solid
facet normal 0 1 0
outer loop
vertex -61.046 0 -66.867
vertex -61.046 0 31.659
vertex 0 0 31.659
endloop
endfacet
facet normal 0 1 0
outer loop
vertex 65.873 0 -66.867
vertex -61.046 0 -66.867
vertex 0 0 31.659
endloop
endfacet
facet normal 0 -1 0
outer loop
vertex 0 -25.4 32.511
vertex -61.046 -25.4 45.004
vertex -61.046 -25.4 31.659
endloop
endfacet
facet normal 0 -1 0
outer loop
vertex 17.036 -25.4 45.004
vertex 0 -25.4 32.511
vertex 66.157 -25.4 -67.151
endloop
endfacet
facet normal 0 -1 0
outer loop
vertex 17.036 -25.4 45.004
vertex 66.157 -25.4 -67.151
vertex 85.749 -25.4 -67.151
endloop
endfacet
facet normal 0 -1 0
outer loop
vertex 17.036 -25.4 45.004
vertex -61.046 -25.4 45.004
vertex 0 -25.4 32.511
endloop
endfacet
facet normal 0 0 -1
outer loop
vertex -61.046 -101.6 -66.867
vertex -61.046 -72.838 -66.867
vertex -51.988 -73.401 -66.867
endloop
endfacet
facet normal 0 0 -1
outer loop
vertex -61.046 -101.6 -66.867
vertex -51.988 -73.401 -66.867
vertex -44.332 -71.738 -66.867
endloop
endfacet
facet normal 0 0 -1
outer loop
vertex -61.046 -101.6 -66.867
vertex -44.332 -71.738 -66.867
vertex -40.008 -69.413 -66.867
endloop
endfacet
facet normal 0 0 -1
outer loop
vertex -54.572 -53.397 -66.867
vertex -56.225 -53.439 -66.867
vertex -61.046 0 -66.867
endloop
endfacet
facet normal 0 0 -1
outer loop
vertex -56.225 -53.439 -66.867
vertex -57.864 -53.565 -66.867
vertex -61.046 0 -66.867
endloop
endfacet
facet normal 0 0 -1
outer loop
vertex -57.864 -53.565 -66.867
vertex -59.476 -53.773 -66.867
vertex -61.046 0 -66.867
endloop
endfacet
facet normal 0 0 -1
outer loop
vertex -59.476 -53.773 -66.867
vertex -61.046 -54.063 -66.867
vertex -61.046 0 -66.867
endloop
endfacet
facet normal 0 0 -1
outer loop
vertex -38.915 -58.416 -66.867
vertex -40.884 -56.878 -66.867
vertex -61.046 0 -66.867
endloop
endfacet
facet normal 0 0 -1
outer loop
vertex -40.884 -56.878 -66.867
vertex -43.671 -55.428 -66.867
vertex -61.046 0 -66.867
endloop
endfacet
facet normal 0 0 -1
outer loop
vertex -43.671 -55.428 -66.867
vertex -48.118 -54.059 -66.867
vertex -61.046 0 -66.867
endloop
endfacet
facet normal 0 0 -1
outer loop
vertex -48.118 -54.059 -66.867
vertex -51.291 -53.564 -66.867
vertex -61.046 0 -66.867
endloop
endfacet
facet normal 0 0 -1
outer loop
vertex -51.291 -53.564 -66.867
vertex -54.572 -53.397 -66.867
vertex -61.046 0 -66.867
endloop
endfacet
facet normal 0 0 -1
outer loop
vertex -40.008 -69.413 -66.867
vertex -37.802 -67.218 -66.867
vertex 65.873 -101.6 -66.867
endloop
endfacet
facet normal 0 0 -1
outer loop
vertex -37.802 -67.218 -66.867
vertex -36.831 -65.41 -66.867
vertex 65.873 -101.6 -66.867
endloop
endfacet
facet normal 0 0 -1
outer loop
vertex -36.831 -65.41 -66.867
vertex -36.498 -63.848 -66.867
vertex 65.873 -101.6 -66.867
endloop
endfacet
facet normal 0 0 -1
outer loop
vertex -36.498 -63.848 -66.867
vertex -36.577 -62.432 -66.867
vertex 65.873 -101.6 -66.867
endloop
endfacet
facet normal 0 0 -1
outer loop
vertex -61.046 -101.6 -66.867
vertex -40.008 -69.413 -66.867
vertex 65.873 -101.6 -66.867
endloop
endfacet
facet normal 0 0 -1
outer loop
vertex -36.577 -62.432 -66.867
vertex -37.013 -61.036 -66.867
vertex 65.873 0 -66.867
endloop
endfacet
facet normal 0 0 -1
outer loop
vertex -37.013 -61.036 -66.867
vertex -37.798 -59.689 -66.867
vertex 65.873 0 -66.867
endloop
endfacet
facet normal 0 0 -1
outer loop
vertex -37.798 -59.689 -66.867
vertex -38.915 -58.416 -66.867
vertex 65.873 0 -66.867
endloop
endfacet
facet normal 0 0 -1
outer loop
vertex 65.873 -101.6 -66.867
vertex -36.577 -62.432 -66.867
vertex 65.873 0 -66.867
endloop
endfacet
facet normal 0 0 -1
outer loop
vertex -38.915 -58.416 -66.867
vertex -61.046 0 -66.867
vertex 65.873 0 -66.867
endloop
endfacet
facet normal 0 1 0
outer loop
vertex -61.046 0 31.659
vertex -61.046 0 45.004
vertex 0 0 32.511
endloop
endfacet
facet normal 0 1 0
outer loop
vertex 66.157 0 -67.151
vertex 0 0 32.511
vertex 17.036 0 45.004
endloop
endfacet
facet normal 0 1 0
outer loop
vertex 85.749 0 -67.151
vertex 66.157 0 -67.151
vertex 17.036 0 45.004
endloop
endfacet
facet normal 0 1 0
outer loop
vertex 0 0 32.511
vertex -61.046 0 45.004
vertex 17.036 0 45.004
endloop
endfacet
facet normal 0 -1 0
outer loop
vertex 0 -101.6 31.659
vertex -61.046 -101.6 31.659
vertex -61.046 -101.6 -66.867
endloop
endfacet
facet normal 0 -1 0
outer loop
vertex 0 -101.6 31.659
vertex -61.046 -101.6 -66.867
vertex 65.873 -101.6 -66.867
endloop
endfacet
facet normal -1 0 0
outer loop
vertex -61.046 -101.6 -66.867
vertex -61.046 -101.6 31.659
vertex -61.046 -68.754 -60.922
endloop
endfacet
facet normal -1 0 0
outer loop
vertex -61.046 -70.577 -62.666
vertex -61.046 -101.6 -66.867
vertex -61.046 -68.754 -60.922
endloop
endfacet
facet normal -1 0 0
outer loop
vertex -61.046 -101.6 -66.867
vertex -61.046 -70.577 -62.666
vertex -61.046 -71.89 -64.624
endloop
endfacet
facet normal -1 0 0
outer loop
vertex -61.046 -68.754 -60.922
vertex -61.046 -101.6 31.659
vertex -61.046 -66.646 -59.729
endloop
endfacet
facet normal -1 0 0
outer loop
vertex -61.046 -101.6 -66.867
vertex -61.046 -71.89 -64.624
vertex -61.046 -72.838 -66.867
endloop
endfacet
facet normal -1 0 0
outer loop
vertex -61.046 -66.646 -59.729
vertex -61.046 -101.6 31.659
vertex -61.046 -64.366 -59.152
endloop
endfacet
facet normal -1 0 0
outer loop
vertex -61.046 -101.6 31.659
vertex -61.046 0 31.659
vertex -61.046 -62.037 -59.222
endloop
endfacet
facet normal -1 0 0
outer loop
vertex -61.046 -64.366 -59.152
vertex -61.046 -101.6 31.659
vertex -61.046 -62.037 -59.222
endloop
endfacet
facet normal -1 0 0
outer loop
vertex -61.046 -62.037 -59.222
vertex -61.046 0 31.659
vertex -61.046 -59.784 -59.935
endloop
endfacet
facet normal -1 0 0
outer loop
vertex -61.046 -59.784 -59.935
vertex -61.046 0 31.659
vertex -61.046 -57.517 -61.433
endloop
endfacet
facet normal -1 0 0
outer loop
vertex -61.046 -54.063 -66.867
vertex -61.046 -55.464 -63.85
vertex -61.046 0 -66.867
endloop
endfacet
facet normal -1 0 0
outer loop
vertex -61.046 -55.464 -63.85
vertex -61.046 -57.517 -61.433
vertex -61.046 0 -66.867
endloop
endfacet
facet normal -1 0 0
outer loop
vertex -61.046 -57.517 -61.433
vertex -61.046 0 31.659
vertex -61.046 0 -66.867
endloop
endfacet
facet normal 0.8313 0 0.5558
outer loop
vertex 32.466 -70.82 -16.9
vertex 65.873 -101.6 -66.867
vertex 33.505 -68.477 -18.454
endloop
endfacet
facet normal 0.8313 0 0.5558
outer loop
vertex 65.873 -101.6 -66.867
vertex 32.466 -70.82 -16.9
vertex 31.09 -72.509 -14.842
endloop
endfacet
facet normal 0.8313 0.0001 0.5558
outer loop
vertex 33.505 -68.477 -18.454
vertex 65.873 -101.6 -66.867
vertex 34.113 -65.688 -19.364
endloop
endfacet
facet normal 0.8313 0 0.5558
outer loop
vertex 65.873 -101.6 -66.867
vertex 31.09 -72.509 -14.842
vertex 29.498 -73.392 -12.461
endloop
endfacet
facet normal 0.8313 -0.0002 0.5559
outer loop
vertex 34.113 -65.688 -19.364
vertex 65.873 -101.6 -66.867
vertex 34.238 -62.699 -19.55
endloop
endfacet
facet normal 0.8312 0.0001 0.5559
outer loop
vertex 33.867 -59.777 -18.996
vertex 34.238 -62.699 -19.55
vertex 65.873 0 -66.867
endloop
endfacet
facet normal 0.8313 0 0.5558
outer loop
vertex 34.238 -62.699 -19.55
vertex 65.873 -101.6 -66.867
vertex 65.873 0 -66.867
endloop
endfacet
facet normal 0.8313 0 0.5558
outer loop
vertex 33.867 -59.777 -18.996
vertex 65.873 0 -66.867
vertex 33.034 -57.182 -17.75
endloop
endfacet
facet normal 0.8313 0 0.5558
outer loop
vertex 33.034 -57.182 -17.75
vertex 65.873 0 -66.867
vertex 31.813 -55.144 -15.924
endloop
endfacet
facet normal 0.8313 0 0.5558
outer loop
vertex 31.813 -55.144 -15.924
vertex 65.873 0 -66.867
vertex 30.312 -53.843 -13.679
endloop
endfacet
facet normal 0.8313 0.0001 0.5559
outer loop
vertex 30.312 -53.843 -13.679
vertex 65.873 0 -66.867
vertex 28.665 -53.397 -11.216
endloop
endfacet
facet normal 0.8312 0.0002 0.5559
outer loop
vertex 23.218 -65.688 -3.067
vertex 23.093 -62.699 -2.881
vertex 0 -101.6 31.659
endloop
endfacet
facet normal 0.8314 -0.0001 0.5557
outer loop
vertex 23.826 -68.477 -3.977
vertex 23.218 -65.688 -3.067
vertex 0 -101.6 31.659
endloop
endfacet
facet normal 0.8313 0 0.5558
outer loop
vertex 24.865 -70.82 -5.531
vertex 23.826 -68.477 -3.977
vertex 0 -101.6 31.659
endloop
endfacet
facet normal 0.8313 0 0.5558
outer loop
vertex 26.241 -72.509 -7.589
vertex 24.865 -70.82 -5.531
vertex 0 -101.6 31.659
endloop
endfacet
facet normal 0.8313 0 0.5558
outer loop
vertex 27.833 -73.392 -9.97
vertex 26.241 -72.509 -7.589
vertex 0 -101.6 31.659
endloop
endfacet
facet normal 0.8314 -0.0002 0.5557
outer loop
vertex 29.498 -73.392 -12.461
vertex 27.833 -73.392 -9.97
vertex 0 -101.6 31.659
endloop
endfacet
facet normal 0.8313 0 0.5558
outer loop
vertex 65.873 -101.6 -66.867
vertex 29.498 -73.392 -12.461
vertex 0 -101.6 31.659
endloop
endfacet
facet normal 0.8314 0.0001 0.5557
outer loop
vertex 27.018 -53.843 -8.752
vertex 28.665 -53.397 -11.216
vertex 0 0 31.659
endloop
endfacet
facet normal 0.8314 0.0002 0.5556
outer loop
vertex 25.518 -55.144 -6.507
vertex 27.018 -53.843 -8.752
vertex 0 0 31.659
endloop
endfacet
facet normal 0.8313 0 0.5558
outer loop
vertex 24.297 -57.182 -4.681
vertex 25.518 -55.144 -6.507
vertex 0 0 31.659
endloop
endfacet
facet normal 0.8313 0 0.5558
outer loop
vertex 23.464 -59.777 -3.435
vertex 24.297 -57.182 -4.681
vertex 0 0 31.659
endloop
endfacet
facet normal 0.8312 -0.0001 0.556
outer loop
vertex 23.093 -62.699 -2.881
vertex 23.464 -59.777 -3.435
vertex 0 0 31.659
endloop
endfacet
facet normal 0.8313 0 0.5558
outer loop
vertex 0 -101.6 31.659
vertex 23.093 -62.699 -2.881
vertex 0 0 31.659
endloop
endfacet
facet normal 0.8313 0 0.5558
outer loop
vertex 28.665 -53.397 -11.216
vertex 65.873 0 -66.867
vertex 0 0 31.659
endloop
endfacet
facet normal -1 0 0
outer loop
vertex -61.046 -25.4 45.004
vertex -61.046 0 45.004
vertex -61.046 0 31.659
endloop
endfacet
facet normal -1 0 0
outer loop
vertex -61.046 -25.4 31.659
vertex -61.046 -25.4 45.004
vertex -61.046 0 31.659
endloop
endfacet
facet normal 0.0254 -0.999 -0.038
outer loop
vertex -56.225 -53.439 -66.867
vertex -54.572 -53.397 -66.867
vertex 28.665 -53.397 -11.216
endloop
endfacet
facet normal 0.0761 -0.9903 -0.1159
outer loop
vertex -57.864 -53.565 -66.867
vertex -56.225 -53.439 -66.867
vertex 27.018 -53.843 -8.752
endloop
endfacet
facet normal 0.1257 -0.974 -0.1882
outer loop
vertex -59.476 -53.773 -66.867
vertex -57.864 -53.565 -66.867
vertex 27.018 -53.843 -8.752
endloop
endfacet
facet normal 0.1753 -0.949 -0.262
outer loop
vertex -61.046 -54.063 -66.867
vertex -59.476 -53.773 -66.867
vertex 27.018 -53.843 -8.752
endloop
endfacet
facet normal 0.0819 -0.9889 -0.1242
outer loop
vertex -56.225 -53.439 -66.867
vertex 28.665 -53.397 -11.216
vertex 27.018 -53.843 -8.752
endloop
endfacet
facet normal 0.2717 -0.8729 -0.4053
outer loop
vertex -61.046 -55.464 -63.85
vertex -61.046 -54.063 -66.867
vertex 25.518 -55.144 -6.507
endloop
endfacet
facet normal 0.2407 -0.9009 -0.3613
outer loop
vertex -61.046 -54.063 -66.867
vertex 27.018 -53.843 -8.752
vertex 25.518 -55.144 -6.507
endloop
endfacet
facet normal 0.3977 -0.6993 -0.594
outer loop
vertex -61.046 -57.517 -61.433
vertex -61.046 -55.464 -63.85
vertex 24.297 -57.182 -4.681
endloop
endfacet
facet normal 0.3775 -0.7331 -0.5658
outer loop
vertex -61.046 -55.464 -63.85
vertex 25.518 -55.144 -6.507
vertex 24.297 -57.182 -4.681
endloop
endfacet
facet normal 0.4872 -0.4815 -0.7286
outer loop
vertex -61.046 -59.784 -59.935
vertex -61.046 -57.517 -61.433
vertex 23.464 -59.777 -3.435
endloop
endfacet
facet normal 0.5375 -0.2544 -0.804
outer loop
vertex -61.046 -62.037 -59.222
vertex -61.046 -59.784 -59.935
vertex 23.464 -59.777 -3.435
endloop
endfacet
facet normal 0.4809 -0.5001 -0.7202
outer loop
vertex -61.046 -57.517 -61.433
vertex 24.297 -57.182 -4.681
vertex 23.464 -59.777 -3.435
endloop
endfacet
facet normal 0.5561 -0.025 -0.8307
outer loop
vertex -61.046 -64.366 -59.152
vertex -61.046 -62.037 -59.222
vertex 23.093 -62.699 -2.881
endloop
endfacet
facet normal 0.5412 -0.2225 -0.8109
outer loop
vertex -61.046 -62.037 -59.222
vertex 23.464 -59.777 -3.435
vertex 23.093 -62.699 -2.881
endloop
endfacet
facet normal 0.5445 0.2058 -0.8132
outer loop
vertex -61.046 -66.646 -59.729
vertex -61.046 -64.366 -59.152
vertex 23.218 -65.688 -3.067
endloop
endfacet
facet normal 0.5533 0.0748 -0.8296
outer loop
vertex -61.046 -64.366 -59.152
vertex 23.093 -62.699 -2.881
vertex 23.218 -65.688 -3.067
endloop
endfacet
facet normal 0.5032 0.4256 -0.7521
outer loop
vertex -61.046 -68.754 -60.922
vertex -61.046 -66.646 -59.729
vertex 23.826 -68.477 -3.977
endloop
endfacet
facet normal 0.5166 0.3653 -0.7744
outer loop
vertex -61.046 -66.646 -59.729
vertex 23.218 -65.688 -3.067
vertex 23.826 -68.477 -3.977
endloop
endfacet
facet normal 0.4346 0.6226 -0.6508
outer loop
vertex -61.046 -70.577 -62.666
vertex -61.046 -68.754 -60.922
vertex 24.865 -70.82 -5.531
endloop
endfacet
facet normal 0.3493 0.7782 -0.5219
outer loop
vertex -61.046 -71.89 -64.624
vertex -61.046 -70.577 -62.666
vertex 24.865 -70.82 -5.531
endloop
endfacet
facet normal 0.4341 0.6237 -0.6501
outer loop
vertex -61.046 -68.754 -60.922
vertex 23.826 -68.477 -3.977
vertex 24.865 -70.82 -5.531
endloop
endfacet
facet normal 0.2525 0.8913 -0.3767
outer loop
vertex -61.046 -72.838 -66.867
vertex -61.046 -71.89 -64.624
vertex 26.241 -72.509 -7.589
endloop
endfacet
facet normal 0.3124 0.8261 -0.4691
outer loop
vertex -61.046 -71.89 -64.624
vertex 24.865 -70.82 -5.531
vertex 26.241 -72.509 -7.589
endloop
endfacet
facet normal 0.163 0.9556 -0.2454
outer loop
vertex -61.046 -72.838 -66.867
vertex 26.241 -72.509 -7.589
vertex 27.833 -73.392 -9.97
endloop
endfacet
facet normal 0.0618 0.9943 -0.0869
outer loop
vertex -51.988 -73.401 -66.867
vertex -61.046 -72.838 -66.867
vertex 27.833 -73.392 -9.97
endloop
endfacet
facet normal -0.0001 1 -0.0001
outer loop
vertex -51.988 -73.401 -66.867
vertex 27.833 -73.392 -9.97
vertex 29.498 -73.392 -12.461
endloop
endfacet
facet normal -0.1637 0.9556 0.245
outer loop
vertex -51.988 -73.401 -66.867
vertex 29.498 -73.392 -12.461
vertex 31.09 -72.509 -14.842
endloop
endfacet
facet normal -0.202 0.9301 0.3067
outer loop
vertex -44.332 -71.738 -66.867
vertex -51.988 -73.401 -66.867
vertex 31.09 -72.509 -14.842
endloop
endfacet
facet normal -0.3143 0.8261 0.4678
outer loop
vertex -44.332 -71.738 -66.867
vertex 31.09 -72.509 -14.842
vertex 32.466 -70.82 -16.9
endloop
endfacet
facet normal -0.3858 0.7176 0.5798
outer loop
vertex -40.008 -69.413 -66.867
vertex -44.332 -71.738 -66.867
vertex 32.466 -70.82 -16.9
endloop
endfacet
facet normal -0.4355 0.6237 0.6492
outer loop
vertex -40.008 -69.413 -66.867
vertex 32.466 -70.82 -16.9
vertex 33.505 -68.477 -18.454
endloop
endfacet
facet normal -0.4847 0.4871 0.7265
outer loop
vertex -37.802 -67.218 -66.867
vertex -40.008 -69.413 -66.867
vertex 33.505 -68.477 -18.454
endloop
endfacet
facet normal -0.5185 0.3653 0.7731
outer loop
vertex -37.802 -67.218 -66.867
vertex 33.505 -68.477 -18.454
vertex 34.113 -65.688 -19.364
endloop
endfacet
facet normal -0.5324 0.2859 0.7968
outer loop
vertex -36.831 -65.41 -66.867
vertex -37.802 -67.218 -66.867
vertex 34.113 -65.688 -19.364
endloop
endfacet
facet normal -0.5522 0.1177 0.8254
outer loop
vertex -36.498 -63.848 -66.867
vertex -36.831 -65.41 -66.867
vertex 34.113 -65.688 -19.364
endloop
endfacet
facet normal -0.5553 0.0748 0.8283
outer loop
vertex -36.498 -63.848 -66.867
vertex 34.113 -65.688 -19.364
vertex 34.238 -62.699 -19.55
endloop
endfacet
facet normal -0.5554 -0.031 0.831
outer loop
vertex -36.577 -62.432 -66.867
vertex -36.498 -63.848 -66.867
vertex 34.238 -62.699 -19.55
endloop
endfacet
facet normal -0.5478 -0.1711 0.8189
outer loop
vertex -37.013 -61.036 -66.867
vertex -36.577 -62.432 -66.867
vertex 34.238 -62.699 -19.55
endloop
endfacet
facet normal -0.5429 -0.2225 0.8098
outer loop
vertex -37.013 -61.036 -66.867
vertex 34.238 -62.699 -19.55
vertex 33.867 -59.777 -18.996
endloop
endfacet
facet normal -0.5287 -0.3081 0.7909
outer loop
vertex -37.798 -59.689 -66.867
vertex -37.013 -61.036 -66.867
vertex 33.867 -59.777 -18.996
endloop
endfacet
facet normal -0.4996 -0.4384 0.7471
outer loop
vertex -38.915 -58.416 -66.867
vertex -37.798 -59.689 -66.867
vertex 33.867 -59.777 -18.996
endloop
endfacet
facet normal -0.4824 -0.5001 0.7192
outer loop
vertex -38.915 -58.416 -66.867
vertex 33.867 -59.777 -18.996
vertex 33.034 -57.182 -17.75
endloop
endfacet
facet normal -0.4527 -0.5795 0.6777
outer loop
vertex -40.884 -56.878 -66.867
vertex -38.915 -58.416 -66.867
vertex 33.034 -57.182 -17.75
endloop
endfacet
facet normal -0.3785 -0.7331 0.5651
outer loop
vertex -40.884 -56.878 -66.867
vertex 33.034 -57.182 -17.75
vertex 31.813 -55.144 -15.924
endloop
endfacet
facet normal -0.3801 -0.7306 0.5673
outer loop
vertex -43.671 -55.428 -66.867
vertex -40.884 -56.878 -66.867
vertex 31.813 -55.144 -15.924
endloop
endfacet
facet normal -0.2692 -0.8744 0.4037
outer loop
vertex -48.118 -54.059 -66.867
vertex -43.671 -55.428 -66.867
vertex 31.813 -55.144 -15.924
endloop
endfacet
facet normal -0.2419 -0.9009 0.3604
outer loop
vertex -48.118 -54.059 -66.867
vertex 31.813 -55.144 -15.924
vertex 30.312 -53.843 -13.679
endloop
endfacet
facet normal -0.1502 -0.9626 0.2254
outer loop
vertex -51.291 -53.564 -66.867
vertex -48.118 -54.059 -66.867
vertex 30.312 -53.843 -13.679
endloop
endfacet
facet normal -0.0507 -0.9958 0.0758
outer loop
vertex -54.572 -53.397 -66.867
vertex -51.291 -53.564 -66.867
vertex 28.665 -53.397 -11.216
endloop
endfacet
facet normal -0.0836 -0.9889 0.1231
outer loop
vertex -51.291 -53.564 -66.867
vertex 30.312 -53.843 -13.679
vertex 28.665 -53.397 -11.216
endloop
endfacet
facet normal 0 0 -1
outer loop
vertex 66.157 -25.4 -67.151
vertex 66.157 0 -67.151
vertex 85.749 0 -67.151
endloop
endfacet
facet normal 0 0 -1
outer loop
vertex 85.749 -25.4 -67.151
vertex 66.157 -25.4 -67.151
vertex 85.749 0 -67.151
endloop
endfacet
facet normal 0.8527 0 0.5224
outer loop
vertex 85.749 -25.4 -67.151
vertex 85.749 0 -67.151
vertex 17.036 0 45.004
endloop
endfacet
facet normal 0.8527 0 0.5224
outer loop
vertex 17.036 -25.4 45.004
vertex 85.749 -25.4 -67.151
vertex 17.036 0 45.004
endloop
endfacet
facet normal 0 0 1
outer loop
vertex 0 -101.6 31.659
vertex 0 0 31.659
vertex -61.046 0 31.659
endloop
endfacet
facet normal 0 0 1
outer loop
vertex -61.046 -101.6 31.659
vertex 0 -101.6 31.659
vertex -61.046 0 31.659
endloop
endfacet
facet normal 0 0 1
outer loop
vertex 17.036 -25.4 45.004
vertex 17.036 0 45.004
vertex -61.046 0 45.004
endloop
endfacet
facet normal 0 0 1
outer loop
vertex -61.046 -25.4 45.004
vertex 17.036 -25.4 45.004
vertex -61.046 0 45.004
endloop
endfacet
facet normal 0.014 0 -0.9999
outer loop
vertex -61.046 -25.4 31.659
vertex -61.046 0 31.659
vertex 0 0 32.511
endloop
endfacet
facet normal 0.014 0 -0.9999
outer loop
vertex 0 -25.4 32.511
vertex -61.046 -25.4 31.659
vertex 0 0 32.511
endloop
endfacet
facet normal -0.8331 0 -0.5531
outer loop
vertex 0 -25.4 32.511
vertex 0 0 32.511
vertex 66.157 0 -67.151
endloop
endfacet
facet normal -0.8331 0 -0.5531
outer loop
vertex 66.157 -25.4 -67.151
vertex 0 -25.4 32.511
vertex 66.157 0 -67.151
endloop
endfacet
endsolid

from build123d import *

# Parameters (mm, degrees)
F1_DEPTH = 101.6
F3_DEPTH = 25.4
F4_R     = 10.0537015356
F5_DEPTH = 105.6688880335


with BuildPart() as f1:
    # F0 (on Front) → F1 (new body)
    with BuildSketch(Plane.XZ):
        Polygon((0, 31.658988446), (-61.0464774072, 31.658988446), (-61.0464774072, -66.8671801686), (65.8733993769, -66.8671801686), align=None)
    extrude(amount=F1_DEPTH)

    # F4 (on face) → F5 (cut, through all)
    with BuildSketch(Plane(origin=(14.6279702494, 0, 9.7800831988), x_dir=(0, 1, 0), z_dir=(0.8313124344, 0, 0.5558053943))):
        with Locations((-63.4505003691, -25.2559632063)):
            Circle(F4_R)
    extrude(amount=-F5_DEPTH, mode=Mode.SUBTRACT)


with BuildPart() as f3:
    # F2 (on Front) → F3 (new body)
    with BuildSketch(Plane.XZ):
        Polygon((-61.0464774072, 45.0040325522), (-61.0464774072, 31.658988446), (0, 32.5108021498), (66.1573410034, -67.1511217952), (85.7489928603, -67.1511217952), (17.0362237841, 45.0040325522), align=None)
    extrude(amount=F3_DEPTH)


solid = Compound([f1.part, f3.part])
